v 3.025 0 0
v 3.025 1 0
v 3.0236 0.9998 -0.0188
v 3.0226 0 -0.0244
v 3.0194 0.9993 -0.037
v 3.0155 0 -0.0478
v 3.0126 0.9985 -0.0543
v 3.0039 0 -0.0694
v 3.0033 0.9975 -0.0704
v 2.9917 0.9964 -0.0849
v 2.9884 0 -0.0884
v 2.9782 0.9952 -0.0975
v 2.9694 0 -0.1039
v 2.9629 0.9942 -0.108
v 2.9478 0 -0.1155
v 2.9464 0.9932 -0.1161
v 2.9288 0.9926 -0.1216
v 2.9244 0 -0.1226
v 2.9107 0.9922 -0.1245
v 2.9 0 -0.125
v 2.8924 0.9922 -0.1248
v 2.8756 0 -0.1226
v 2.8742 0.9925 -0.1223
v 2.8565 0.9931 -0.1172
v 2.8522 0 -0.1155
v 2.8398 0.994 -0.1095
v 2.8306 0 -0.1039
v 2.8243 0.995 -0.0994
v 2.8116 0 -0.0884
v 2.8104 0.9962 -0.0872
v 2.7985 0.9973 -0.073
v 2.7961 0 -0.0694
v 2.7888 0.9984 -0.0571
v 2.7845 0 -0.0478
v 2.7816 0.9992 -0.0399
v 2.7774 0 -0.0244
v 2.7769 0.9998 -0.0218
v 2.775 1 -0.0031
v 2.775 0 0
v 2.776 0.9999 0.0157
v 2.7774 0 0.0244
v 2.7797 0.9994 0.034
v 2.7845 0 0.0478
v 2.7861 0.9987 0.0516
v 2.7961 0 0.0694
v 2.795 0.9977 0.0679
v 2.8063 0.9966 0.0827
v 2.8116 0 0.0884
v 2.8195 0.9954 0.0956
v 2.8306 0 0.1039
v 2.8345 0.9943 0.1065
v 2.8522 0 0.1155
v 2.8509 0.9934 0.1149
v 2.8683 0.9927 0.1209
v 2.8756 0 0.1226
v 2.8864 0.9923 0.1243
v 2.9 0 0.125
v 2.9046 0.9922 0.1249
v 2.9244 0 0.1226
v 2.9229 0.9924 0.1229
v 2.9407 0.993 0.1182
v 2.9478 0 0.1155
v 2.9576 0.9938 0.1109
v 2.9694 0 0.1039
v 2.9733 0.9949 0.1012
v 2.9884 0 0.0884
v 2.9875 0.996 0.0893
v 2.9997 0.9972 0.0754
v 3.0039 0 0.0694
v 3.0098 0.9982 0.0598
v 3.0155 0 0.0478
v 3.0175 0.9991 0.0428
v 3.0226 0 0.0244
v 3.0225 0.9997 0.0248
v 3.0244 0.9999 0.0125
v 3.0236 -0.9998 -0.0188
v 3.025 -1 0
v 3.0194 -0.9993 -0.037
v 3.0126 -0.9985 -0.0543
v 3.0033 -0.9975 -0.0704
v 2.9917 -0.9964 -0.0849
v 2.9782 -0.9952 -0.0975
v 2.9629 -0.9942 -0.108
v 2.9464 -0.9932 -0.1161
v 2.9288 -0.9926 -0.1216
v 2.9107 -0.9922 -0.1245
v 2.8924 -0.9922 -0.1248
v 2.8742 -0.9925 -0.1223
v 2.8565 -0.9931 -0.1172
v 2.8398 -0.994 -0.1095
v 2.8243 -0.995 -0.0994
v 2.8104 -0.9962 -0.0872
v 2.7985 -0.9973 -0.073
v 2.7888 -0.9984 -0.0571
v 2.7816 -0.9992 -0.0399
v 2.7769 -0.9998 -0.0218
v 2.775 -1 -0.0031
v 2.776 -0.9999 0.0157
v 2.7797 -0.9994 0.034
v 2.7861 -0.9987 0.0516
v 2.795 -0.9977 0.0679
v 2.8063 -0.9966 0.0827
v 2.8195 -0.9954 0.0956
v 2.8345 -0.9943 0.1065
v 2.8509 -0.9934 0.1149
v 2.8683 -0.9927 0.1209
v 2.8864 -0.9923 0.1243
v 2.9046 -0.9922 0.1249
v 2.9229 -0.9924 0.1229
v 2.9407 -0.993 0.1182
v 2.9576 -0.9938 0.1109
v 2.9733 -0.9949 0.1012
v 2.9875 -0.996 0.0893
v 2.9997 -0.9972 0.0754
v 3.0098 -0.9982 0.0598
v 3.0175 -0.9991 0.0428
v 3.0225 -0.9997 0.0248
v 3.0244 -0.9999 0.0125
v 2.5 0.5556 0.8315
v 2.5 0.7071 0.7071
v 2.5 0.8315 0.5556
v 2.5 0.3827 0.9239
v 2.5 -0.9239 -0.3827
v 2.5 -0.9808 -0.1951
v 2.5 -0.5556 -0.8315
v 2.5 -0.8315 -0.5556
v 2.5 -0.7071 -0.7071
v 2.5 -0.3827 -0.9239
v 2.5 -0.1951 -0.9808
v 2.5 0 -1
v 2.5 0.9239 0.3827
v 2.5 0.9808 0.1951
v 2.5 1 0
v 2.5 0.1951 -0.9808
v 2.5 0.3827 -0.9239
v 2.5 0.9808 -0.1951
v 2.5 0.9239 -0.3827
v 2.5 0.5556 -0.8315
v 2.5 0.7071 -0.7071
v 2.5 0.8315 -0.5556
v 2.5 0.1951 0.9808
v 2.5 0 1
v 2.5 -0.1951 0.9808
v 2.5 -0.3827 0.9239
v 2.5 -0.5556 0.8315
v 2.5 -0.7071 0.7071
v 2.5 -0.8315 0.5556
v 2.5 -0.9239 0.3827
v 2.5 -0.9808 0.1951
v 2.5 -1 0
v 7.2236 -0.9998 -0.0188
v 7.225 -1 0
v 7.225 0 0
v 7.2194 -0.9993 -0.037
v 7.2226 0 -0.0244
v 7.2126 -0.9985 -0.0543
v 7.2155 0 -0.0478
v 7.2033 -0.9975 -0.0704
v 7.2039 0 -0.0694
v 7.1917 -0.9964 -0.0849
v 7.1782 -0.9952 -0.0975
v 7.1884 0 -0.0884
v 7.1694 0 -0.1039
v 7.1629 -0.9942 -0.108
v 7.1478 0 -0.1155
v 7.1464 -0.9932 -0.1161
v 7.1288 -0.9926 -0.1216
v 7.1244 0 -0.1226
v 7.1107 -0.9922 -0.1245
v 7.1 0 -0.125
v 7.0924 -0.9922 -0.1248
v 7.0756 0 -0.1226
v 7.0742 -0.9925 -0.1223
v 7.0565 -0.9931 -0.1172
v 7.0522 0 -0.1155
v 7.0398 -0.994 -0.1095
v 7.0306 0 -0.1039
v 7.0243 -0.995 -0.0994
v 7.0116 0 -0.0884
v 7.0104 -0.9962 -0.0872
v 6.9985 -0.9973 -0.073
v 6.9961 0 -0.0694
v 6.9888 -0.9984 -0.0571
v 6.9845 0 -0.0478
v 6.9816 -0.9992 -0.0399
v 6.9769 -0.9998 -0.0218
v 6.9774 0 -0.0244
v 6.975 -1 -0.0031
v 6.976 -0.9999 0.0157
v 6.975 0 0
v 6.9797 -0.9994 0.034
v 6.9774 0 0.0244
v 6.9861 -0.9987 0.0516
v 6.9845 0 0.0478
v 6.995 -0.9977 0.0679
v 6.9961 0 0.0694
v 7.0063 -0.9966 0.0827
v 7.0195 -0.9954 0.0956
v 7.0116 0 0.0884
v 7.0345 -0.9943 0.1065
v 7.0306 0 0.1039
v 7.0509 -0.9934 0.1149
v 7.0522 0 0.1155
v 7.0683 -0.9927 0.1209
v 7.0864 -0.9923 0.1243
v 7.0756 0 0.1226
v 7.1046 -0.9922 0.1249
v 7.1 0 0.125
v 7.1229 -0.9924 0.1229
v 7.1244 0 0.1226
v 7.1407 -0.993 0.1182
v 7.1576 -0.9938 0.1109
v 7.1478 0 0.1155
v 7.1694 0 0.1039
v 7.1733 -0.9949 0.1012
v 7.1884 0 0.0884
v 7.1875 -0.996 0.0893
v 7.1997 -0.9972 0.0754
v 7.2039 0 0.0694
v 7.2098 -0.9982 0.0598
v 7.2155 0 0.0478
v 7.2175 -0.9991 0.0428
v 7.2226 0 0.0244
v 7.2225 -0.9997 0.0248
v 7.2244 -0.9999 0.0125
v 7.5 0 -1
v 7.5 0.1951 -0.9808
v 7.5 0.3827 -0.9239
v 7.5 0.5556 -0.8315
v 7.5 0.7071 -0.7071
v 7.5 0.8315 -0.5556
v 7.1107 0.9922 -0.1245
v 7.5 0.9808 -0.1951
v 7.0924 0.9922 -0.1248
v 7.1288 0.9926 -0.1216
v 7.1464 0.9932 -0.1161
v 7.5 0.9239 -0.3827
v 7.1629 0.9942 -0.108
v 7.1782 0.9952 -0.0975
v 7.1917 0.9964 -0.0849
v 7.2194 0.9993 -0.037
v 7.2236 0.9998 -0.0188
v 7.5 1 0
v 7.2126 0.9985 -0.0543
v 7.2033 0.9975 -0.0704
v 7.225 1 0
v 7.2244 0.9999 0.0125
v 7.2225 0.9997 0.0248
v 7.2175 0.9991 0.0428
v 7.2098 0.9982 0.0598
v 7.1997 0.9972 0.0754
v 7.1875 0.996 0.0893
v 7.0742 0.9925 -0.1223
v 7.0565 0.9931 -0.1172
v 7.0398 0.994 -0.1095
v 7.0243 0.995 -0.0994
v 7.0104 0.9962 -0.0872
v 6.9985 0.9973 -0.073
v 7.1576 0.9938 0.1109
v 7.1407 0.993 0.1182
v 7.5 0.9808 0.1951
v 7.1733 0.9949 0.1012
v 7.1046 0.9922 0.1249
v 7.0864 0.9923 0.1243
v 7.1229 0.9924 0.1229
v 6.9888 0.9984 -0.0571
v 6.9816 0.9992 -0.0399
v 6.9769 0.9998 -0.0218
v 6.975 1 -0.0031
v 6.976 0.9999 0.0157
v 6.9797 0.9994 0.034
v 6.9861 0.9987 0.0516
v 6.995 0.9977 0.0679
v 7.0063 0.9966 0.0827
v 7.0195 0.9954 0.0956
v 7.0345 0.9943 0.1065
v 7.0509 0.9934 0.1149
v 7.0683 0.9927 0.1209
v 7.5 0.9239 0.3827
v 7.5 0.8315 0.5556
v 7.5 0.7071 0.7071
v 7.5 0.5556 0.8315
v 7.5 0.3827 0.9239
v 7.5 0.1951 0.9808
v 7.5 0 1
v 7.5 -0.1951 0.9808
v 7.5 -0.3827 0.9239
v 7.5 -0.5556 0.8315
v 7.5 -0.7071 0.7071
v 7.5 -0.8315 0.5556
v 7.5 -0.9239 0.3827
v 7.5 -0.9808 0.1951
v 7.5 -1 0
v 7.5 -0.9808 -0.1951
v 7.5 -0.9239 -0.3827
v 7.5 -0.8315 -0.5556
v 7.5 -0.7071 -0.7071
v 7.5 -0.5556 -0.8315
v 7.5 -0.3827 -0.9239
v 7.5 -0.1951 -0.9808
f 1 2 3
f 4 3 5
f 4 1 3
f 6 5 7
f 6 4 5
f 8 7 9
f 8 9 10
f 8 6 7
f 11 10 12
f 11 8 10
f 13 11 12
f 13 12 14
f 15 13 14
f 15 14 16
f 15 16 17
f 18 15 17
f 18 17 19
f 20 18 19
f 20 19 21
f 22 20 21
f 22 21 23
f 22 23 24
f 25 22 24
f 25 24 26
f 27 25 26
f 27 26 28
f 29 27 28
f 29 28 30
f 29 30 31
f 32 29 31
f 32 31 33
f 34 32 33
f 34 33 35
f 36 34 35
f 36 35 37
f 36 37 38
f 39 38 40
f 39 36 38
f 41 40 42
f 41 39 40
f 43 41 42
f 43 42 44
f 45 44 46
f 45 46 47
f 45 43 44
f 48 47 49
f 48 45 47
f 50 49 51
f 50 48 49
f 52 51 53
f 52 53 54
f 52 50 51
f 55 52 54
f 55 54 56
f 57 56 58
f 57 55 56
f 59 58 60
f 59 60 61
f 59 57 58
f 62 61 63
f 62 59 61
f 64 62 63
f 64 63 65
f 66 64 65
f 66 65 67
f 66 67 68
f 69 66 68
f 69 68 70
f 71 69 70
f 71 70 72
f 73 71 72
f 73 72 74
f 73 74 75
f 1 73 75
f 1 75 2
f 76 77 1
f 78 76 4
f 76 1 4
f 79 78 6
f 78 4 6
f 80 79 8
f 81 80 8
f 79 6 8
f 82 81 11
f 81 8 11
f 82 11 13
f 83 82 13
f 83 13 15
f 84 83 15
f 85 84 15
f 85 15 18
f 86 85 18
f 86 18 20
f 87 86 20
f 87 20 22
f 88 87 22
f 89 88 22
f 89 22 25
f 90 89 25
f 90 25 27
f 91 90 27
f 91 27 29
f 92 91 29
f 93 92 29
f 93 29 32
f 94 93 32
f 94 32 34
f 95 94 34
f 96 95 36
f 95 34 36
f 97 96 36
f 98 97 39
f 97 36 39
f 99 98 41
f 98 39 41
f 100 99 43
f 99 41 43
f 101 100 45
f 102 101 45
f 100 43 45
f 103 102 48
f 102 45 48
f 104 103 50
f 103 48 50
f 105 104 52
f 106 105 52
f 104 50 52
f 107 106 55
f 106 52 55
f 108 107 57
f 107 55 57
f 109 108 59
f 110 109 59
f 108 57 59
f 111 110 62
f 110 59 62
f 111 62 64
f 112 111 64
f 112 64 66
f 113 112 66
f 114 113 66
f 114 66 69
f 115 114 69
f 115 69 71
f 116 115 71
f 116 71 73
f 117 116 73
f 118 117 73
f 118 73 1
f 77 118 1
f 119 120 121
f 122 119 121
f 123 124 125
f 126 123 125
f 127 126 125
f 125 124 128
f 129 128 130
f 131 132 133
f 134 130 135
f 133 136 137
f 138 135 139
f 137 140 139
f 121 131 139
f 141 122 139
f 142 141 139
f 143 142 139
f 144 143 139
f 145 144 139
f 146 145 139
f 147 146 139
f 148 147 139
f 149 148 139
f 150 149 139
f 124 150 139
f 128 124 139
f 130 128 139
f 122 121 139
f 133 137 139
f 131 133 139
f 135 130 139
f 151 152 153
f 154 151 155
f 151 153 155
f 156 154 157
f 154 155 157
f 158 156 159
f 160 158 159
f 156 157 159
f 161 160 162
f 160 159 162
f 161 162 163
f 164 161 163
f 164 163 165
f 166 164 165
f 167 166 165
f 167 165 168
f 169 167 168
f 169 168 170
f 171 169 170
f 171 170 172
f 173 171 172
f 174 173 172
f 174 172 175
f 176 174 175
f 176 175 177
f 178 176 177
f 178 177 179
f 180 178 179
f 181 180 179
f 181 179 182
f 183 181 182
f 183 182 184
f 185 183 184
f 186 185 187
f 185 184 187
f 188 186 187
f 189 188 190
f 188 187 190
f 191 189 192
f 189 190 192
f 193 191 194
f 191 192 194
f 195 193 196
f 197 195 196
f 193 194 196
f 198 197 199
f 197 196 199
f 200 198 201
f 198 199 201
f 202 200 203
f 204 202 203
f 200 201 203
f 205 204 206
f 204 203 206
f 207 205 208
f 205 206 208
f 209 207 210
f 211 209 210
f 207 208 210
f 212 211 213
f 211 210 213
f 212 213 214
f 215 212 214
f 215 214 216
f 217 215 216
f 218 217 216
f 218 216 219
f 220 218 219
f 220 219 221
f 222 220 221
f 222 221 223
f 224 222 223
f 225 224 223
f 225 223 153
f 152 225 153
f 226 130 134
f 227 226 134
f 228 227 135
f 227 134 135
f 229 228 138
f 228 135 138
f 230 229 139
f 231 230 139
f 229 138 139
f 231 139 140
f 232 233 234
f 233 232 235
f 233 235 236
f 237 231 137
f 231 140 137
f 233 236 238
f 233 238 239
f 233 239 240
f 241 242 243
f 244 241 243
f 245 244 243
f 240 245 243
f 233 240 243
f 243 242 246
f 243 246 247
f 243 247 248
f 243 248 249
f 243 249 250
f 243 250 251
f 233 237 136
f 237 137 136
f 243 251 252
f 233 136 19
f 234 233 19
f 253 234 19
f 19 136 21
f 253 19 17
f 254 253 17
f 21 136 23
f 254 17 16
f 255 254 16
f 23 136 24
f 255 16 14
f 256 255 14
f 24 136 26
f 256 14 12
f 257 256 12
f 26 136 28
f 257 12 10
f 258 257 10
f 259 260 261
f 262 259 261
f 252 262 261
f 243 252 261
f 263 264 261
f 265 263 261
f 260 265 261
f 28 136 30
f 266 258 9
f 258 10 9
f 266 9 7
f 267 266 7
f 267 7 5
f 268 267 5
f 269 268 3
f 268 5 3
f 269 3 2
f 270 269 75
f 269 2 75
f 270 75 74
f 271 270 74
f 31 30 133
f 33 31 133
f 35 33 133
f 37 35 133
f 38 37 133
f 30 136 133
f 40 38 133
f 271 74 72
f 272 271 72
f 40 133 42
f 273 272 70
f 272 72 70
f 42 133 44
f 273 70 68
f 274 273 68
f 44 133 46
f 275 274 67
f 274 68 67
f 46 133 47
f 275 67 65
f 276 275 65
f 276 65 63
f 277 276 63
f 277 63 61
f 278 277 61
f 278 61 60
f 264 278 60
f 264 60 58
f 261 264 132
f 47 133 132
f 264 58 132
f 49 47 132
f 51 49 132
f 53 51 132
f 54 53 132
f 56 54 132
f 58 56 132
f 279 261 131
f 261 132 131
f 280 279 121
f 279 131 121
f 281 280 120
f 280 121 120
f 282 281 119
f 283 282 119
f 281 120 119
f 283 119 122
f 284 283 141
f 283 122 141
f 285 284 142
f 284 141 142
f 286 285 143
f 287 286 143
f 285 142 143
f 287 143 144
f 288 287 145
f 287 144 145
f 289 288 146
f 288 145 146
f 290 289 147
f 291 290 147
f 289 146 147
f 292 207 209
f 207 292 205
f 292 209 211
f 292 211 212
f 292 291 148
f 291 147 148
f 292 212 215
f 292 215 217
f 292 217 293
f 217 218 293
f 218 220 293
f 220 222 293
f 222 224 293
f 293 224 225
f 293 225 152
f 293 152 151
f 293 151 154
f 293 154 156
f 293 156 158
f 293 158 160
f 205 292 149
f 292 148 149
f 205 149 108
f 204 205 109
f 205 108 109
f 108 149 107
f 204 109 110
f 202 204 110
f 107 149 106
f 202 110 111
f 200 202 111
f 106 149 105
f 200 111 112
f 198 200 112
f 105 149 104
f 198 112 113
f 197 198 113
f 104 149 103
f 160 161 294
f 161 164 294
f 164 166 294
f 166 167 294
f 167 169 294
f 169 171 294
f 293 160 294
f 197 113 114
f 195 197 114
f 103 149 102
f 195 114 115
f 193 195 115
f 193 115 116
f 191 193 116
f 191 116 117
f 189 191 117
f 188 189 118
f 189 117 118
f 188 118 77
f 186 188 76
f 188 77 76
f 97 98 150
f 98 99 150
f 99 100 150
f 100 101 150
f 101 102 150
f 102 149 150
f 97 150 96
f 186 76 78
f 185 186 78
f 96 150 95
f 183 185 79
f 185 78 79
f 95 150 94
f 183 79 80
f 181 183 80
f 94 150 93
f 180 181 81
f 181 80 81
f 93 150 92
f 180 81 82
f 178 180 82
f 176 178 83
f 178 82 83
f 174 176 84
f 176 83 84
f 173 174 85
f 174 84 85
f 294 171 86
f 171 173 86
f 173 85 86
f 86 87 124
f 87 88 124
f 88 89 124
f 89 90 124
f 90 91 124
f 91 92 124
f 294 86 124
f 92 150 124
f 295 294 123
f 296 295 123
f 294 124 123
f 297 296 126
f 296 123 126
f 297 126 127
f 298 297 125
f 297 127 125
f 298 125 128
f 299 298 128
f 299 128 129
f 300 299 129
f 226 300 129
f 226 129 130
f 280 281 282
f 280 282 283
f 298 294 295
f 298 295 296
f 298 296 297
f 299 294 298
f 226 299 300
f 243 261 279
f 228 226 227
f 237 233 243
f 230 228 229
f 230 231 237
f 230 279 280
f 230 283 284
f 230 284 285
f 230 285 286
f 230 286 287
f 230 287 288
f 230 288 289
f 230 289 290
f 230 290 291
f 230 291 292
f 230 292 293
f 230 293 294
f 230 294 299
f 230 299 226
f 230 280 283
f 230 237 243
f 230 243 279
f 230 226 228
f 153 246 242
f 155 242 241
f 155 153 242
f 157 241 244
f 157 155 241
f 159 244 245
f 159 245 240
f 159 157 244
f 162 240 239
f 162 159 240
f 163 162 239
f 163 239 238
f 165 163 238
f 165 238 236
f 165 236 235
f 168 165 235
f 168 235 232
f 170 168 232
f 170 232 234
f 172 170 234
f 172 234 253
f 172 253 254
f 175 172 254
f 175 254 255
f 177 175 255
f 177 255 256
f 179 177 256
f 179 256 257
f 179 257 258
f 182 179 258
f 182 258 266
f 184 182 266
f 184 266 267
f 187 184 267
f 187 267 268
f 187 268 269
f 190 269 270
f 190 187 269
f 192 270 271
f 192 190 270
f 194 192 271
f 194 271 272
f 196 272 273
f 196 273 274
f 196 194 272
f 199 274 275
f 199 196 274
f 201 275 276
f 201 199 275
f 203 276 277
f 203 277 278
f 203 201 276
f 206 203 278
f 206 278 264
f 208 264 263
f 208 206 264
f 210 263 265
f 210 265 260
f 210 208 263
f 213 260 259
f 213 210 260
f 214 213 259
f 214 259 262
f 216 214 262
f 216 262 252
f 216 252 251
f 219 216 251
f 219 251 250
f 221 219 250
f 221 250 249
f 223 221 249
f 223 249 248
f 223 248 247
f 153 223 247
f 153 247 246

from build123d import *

# Parameters (mm, degrees)
IZIM1_R                     = 2
Y_KSEKLIK_EKSTR_ZYON1_DEPTH = 10
KES_EKSTR_ZYON1_DEPTH       = 10
KES_EKSTR_ZYON1_DEPTH_BACK  = 10
IZIM2_R                     = 0.25
L_EK1_SCALE                 = 0.5


with BuildPart() as part:
    # Çizim1 → Yükseklik-Ekstrüzyon1 (new body)
    with BuildSketch(Plane(origin=(0, 0, 0), x_dir=(0, 0, -1), z_dir=(1, 0, 0))):
        Circle(IZIM1_R)
    extrude(amount=Y_KSEKLIK_EKSTR_ZYON1_DEPTH)

    # Çizim2 → Kes-Ekstrüzyon1 (cut, two sides: drawn at the far end of the back side and taken through both)
    with BuildSketch(Plane(origin=(0, 0, 0), x_dir=(1, 0, 0), z_dir=(0, 1, 0)).offset(-KES_EKSTR_ZYON1_DEPTH_BACK)):
        with Locations((0.8, 0)):
            Circle(IZIM2_R)
        with Locations((9.2, 0)):
            Circle(IZIM2_R)
    extrude(amount=KES_EKSTR_ZYON1_DEPTH + KES_EKSTR_ZYON1_DEPTH_BACK, mode=Mode.SUBTRACT)


with BuildPart() as part_1:
    # Ölçek1: scaled about (4.999999983, 0, 4.1e-08)
    add(part.part.scale(L_EK1_SCALE).moved(Location((2.499999992, 0, 2.1e-08))))


solid = part_1.part
